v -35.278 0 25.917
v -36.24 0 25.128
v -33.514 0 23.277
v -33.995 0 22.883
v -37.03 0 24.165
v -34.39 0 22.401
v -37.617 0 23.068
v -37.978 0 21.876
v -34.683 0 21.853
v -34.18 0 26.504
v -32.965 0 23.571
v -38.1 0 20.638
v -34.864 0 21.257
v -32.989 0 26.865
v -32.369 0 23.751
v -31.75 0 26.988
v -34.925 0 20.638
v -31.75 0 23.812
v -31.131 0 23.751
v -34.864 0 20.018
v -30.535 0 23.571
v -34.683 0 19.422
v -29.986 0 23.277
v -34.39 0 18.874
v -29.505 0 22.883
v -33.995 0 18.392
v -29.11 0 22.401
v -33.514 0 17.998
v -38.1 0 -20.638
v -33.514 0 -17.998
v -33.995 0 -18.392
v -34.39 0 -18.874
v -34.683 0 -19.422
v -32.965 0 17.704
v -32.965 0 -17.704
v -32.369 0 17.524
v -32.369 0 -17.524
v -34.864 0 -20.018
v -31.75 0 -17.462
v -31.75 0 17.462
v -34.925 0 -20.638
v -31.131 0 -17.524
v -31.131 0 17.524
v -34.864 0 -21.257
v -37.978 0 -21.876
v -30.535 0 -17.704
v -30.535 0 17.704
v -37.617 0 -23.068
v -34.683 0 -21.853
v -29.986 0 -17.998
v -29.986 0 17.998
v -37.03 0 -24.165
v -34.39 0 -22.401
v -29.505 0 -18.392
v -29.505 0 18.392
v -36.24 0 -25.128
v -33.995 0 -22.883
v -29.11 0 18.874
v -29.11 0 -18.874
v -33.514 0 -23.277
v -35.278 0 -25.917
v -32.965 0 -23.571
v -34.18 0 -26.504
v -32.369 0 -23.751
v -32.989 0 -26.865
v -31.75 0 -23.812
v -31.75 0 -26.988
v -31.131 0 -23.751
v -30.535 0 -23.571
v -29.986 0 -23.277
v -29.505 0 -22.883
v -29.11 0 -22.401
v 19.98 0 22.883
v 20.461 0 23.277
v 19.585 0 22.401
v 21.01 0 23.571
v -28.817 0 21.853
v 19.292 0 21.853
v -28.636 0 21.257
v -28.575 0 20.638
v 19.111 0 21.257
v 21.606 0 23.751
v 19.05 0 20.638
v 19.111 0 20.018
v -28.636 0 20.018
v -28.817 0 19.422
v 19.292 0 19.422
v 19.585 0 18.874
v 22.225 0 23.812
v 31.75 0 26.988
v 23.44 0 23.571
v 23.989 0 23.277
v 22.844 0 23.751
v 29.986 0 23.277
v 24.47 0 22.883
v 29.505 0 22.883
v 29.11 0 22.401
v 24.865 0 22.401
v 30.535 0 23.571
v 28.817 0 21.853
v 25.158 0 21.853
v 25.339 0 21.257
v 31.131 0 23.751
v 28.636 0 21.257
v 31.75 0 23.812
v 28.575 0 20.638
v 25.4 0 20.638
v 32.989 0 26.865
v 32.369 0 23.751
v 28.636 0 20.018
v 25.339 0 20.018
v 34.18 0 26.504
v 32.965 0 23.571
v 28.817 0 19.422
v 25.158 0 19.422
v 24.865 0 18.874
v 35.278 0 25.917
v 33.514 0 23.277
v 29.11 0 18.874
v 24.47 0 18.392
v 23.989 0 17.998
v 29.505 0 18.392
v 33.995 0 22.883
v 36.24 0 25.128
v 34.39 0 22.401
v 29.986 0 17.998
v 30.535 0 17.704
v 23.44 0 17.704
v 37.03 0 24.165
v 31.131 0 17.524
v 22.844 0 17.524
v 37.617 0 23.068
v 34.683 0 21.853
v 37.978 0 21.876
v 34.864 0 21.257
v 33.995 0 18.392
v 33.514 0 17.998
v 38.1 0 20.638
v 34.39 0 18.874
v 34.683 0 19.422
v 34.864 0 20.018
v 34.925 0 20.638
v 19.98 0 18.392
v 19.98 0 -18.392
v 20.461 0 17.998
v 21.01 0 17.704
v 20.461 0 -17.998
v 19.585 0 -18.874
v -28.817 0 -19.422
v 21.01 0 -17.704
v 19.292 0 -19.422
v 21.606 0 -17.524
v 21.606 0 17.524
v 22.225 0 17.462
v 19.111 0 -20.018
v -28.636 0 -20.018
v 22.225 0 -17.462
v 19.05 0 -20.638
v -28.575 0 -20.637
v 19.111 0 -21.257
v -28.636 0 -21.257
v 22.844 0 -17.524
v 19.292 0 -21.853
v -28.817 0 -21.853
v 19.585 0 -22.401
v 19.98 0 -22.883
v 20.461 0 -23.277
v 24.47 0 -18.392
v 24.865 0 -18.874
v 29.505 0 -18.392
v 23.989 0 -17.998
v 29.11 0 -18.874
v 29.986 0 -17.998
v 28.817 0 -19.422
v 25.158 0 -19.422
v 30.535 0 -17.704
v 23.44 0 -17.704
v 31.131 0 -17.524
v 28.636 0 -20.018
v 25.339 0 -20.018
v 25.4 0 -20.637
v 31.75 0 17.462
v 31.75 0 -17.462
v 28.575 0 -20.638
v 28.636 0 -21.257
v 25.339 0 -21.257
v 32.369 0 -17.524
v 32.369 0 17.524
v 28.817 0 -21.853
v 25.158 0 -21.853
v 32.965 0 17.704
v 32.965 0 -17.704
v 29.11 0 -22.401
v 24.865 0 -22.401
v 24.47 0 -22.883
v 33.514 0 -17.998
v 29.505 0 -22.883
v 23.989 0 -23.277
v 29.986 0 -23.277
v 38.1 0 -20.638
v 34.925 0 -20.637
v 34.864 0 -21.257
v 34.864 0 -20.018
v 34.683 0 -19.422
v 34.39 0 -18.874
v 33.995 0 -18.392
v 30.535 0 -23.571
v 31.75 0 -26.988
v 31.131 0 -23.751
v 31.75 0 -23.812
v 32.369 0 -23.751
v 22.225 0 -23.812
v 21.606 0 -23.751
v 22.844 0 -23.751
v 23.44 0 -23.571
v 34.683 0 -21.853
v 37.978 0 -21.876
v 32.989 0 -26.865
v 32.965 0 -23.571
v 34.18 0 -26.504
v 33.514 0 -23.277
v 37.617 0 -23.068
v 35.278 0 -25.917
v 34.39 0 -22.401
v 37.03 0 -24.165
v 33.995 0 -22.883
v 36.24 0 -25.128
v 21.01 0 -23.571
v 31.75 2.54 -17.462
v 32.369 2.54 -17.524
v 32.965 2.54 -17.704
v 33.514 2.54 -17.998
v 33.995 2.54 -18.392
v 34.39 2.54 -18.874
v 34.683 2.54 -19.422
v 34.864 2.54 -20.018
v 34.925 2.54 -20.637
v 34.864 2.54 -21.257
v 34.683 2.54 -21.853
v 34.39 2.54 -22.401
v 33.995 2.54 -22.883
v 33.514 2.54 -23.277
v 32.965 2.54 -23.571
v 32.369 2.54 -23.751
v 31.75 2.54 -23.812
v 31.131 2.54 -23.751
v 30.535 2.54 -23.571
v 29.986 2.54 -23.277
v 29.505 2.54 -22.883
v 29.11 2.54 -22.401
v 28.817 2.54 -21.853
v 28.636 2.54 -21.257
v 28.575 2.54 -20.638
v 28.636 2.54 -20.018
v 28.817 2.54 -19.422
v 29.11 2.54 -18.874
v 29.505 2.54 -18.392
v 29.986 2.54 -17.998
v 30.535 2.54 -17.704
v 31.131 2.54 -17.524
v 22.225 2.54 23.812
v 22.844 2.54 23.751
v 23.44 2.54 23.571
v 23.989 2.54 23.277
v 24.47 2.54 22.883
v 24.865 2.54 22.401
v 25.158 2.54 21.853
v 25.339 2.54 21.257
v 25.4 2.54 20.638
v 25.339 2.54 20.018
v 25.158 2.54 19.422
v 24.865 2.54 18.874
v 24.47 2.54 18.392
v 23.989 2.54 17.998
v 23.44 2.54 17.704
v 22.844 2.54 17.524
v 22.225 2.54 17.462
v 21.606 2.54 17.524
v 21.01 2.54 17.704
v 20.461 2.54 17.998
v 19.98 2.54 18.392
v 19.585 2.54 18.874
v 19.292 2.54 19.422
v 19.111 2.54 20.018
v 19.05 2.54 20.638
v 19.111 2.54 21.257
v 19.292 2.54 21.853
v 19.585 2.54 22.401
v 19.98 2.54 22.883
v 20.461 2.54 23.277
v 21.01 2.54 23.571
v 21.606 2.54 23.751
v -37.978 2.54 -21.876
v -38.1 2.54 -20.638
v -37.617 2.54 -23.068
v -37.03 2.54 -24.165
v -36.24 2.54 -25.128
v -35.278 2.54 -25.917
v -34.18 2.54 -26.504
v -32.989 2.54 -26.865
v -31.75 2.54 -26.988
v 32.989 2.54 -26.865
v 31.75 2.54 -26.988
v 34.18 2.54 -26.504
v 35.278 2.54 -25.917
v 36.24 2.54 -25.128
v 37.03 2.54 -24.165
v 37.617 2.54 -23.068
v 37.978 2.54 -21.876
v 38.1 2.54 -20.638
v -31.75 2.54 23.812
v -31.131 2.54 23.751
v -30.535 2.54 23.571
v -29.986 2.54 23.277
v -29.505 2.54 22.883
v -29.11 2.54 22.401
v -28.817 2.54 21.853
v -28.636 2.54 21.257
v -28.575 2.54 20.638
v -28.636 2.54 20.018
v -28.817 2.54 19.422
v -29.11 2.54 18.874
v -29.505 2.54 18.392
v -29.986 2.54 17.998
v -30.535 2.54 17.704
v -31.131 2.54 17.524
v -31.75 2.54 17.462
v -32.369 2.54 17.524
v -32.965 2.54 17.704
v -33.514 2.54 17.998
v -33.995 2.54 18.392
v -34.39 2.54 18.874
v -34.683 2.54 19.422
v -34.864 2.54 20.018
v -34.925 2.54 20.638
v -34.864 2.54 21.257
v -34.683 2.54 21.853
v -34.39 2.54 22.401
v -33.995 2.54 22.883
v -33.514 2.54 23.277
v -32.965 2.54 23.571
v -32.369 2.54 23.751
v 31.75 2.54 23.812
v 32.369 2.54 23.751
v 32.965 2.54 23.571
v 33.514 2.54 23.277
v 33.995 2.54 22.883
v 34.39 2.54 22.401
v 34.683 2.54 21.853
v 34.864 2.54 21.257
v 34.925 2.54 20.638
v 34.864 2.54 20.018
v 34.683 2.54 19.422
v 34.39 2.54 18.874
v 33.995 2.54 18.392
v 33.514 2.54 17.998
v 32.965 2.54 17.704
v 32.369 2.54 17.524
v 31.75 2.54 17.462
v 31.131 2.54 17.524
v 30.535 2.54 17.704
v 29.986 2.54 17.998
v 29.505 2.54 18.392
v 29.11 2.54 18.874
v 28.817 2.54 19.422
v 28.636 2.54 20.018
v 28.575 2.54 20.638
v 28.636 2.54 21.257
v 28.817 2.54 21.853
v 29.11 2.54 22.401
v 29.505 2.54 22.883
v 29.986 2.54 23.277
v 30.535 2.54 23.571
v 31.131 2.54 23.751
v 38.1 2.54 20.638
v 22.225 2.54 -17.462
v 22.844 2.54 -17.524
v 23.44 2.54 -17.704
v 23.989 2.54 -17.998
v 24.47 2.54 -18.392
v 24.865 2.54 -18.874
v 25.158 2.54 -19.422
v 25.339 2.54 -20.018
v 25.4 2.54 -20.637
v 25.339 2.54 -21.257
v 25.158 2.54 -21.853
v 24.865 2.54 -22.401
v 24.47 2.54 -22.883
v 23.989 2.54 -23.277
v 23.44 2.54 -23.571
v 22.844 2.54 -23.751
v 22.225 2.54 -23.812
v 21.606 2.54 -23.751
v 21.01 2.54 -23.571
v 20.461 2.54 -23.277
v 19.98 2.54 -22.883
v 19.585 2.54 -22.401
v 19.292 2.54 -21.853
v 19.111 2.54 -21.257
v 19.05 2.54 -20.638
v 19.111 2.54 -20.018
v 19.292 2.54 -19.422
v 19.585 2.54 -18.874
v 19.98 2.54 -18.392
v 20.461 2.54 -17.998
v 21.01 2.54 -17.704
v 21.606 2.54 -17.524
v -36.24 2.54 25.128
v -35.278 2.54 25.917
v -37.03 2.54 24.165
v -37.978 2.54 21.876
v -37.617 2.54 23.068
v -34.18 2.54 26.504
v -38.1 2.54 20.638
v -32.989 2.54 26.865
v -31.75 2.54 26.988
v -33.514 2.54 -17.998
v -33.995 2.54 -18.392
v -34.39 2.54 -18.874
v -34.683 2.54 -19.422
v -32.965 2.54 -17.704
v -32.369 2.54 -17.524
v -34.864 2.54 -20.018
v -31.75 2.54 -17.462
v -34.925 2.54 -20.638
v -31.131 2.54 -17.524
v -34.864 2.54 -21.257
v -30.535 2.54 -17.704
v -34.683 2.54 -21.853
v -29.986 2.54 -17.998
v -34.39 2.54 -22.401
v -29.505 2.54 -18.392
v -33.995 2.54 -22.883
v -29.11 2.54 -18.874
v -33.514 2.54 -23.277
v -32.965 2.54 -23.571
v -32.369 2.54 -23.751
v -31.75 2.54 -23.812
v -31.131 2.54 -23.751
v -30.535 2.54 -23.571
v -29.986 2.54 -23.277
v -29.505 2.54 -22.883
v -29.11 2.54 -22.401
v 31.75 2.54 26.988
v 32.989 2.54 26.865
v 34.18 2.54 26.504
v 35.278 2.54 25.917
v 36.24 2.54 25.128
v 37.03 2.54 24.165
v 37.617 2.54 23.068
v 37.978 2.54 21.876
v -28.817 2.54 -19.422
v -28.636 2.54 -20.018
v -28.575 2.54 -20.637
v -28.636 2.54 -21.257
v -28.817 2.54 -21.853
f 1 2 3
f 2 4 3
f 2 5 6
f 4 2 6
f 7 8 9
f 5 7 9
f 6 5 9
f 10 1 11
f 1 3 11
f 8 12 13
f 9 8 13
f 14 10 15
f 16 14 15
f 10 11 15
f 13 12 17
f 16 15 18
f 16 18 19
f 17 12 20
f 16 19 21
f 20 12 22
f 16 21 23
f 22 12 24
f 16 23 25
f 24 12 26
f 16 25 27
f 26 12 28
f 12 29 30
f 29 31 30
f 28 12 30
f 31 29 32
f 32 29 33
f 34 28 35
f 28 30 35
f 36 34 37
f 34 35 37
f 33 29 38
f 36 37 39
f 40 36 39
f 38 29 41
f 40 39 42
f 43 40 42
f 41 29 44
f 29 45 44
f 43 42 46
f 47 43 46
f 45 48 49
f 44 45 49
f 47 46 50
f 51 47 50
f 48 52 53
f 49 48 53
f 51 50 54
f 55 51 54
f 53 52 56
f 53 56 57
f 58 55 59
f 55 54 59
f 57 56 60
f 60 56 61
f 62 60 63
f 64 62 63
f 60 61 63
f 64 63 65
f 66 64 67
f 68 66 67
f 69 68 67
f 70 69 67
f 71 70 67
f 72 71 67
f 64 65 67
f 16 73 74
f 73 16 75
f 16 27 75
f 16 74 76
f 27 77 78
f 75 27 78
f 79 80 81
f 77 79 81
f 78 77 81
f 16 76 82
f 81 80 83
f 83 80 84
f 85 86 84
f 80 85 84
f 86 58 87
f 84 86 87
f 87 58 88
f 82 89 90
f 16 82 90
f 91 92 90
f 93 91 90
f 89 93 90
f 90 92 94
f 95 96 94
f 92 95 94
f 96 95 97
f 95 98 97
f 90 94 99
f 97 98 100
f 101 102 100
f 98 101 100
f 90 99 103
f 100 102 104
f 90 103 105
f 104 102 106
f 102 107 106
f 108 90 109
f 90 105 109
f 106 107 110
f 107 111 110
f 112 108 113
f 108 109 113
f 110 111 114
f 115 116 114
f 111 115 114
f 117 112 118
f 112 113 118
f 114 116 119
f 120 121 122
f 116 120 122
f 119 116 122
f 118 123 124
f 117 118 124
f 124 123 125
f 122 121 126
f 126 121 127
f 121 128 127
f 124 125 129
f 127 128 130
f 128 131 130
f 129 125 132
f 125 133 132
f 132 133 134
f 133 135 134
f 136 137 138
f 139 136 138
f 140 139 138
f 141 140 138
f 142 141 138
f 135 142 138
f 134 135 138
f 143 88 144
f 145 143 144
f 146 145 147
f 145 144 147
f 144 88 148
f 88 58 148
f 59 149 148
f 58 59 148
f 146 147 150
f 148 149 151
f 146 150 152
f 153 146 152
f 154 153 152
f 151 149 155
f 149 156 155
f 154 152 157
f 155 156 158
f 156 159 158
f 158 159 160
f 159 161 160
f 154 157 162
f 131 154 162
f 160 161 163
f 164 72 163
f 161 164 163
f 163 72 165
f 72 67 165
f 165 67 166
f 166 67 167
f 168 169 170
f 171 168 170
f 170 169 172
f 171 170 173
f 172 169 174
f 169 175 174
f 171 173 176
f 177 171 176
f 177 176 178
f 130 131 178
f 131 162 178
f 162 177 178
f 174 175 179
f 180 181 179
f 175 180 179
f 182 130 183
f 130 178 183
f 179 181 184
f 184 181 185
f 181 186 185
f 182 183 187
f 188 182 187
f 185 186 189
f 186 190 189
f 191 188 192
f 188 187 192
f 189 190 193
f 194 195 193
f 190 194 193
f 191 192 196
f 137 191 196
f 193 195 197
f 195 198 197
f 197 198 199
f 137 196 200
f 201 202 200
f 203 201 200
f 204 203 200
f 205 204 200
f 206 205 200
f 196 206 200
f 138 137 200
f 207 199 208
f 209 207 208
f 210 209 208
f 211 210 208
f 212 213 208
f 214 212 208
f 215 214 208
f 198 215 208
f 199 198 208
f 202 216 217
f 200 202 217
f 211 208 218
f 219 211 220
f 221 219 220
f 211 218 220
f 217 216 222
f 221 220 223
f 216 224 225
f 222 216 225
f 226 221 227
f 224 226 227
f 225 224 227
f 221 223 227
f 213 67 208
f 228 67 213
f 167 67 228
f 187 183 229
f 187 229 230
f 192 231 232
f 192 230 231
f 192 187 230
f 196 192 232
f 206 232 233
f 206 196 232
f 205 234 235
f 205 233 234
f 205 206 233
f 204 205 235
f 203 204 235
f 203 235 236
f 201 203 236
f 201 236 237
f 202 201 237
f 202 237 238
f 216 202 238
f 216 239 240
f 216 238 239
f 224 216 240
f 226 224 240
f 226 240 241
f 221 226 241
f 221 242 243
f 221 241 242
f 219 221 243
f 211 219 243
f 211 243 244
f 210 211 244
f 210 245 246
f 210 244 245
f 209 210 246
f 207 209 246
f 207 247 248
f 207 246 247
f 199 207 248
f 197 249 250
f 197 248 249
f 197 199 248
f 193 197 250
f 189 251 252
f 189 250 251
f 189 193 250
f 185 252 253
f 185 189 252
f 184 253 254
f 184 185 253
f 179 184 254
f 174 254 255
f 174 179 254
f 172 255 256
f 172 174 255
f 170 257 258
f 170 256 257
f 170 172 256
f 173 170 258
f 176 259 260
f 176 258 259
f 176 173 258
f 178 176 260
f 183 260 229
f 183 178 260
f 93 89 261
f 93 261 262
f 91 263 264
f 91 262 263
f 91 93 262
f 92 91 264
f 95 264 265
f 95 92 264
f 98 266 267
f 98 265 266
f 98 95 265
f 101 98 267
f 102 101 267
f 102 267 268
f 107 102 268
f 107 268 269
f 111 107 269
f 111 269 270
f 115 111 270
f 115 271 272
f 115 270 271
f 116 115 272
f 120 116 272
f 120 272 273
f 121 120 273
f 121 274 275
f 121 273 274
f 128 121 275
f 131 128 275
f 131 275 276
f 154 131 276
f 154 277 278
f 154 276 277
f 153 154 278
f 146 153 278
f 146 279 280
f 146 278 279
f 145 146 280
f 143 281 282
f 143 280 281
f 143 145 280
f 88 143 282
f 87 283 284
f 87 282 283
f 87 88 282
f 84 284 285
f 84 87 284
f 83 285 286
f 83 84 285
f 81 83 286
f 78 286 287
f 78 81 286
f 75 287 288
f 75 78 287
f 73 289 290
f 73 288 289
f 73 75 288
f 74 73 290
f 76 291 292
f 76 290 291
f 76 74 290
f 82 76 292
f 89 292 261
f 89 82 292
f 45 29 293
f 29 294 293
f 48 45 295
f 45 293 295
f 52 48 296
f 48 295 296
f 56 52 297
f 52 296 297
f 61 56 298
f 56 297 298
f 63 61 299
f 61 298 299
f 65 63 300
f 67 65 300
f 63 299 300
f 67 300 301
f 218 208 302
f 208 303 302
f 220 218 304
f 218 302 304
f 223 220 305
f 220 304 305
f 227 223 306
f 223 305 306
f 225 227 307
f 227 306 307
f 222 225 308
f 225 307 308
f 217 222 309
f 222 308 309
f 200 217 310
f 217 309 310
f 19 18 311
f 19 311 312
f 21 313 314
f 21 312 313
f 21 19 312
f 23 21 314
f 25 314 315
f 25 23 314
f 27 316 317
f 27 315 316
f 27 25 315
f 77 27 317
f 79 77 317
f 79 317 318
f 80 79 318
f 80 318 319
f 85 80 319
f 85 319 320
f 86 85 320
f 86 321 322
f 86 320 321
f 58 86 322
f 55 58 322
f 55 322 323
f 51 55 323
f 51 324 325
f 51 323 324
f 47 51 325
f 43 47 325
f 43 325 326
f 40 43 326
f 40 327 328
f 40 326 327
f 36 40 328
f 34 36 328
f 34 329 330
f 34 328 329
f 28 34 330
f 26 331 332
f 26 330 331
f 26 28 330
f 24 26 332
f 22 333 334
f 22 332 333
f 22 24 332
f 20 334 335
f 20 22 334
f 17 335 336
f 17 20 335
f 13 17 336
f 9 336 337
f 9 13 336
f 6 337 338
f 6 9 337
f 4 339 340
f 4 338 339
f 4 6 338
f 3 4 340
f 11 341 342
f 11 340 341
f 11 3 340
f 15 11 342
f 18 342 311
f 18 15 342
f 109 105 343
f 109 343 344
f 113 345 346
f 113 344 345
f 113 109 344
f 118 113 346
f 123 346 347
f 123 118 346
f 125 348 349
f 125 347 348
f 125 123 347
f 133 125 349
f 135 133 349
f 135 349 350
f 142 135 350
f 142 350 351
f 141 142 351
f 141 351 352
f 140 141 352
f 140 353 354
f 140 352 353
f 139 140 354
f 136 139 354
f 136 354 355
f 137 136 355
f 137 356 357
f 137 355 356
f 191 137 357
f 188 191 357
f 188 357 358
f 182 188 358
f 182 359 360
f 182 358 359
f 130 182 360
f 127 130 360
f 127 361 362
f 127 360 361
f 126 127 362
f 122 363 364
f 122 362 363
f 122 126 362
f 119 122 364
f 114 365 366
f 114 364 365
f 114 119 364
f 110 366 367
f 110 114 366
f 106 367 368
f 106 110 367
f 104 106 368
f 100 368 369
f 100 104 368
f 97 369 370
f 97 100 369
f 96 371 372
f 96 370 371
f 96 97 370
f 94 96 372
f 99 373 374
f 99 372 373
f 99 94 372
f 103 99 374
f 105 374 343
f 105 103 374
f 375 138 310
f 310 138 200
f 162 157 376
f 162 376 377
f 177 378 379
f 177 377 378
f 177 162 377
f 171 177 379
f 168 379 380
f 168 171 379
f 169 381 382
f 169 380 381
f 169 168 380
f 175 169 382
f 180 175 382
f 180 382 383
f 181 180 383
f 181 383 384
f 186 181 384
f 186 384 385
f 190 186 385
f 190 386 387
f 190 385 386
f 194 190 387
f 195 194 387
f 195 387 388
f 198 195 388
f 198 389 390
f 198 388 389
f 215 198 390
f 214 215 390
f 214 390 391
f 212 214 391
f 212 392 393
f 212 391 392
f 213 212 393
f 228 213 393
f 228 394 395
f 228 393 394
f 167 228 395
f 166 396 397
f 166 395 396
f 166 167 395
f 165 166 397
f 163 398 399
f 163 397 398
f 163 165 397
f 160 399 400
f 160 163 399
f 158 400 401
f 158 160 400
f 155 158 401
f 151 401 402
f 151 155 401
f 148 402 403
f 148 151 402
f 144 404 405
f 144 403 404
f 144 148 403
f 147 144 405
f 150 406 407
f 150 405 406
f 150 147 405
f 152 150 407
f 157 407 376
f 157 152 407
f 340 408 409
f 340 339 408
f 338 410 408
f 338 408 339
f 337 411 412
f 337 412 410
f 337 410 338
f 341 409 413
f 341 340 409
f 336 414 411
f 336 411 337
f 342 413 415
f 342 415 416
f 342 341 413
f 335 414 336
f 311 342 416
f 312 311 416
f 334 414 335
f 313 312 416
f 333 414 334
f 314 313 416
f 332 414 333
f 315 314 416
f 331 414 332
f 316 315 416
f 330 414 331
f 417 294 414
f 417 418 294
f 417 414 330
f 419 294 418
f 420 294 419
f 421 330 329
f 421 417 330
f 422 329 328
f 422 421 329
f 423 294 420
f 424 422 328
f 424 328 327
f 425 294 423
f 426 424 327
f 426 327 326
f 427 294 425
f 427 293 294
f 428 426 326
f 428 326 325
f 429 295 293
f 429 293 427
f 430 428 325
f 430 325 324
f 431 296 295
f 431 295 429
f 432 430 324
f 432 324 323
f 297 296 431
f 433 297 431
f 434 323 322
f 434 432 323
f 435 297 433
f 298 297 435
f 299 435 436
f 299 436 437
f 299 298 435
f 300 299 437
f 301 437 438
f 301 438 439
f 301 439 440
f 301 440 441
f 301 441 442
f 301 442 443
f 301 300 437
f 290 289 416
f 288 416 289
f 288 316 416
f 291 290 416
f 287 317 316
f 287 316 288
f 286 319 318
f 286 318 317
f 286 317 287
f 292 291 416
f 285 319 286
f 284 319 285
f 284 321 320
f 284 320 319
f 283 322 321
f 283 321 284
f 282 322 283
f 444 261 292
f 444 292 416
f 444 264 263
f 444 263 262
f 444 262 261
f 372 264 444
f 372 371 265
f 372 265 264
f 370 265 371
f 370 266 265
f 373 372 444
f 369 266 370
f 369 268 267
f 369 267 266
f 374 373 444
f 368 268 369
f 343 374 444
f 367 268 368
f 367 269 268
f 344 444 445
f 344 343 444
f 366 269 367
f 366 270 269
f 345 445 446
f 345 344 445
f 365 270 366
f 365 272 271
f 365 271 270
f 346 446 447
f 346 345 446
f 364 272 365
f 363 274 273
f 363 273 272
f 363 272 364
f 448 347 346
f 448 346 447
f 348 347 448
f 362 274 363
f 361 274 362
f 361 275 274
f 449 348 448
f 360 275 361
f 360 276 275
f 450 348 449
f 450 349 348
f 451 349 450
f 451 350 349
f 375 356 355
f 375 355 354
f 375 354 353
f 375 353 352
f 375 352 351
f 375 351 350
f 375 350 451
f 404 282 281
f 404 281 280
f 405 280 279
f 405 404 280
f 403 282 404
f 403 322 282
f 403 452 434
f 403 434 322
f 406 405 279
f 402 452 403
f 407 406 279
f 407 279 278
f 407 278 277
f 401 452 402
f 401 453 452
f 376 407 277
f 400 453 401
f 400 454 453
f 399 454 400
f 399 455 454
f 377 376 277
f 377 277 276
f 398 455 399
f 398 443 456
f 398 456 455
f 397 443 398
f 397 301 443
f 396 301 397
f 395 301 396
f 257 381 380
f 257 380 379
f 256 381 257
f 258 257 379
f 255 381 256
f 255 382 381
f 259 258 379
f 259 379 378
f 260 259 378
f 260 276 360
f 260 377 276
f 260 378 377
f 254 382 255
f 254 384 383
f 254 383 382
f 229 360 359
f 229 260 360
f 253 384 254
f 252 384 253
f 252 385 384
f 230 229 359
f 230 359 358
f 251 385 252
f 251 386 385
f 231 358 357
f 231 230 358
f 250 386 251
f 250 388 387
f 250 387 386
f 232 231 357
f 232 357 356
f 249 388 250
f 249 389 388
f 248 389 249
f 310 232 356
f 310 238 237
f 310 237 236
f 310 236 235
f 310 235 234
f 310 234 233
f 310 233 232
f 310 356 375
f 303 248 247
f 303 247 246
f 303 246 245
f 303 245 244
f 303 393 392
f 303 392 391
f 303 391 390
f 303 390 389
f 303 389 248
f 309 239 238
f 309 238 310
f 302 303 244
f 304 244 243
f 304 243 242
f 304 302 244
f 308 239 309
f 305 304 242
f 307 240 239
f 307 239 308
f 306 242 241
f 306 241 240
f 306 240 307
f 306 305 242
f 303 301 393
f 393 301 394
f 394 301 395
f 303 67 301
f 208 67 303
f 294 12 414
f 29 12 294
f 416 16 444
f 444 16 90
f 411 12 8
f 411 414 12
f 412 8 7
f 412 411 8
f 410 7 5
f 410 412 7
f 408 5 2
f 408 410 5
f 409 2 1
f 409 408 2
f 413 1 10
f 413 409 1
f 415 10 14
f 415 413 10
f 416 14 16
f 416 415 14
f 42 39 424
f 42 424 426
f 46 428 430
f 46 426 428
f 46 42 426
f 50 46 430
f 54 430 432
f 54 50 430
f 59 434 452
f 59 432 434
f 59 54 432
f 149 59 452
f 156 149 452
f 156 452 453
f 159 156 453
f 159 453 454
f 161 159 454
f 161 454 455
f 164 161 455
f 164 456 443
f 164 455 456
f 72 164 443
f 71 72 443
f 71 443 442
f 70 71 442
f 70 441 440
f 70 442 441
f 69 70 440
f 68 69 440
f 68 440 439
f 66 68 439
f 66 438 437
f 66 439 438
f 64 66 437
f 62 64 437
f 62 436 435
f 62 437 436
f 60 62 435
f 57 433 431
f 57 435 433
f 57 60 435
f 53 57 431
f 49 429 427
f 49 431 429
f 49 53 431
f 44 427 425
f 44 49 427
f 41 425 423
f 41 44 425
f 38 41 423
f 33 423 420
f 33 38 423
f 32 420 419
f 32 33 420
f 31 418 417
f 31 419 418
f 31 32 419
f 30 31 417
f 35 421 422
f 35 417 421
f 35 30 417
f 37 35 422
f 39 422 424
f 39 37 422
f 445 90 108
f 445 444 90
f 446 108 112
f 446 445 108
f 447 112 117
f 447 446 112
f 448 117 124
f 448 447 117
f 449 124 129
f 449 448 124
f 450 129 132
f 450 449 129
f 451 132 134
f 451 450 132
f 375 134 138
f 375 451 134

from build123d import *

# Parameters (mm, degrees)
MAIN_LID_SKETCH_W   = 76.2
MAIN_LID_SKETCH_H   = 53.975
MAIN_LID_DEPTH      = 2.54
HOLE_CUT_DEPTH      = 47.758814744
HOLE_CUT_DEPTH_BACK = 47.758814744
HOLE_CUT_SKETCH_R   = 3.175
CORNER_FILLET_R     = 6.35


with BuildPart() as part:
    # Main Lid Sketch → Main Lid (new body)
    with BuildSketch(Plane(origin=(0, 0, 0), x_dir=(1, 0, 0), z_dir=(0, 1, 0))):
        Rectangle(MAIN_LID_SKETCH_W, MAIN_LID_SKETCH_H)
    extrude(amount=MAIN_LID_DEPTH)

    # Hole Cut Sketch → Hole Cut (cut, two sides: drawn at the far end of the back side and taken through both)
    with BuildSketch(Plane(origin=(0, 2.54, 0), x_dir=(1, 0, 0), z_dir=(0, 1, 0)).offset(-HOLE_CUT_DEPTH_BACK)):
        with Locations(Location((31.75, -20.6375, 0), (0, 0, 270))):
            Circle(HOLE_CUT_SKETCH_R)
        with Locations(Location((22.225, -20.6375, 0), (0, 0, 270))):
            Circle(HOLE_CUT_SKETCH_R)
        with Locations(Location((-31.75, -20.6375, 0), (0, 0, 270))):
            Circle(HOLE_CUT_SKETCH_R)
        with Locations(Location((-31.75, 20.6375, 0), (0, 0, 270))):
            Circle(HOLE_CUT_SKETCH_R)
        with Locations(Location((22.225, 20.6375, 0), (0, 0, 270))):
            Circle(HOLE_CUT_SKETCH_R)
        with Locations(Location((31.75, 20.6375, 0), (0, 0, 270))):
            Circle(HOLE_CUT_SKETCH_R)
    extrude(amount=HOLE_CUT_DEPTH + HOLE_CUT_DEPTH_BACK, mode=Mode.SUBTRACT)

    # Corner Fillet
    corner_fillet_edges = [part.edges().sort_by_distance(p)[0] for p in [
        (-38.1, 1.27, -26.9875),
        (38.1, 1.27, -26.9875),
        (38.1, 1.27, 26.9875),
        (-38.1, 1.27, 26.9875),
    ]]
    fillet(corner_fillet_edges, radius=CORNER_FILLET_R)


solid = part.part
